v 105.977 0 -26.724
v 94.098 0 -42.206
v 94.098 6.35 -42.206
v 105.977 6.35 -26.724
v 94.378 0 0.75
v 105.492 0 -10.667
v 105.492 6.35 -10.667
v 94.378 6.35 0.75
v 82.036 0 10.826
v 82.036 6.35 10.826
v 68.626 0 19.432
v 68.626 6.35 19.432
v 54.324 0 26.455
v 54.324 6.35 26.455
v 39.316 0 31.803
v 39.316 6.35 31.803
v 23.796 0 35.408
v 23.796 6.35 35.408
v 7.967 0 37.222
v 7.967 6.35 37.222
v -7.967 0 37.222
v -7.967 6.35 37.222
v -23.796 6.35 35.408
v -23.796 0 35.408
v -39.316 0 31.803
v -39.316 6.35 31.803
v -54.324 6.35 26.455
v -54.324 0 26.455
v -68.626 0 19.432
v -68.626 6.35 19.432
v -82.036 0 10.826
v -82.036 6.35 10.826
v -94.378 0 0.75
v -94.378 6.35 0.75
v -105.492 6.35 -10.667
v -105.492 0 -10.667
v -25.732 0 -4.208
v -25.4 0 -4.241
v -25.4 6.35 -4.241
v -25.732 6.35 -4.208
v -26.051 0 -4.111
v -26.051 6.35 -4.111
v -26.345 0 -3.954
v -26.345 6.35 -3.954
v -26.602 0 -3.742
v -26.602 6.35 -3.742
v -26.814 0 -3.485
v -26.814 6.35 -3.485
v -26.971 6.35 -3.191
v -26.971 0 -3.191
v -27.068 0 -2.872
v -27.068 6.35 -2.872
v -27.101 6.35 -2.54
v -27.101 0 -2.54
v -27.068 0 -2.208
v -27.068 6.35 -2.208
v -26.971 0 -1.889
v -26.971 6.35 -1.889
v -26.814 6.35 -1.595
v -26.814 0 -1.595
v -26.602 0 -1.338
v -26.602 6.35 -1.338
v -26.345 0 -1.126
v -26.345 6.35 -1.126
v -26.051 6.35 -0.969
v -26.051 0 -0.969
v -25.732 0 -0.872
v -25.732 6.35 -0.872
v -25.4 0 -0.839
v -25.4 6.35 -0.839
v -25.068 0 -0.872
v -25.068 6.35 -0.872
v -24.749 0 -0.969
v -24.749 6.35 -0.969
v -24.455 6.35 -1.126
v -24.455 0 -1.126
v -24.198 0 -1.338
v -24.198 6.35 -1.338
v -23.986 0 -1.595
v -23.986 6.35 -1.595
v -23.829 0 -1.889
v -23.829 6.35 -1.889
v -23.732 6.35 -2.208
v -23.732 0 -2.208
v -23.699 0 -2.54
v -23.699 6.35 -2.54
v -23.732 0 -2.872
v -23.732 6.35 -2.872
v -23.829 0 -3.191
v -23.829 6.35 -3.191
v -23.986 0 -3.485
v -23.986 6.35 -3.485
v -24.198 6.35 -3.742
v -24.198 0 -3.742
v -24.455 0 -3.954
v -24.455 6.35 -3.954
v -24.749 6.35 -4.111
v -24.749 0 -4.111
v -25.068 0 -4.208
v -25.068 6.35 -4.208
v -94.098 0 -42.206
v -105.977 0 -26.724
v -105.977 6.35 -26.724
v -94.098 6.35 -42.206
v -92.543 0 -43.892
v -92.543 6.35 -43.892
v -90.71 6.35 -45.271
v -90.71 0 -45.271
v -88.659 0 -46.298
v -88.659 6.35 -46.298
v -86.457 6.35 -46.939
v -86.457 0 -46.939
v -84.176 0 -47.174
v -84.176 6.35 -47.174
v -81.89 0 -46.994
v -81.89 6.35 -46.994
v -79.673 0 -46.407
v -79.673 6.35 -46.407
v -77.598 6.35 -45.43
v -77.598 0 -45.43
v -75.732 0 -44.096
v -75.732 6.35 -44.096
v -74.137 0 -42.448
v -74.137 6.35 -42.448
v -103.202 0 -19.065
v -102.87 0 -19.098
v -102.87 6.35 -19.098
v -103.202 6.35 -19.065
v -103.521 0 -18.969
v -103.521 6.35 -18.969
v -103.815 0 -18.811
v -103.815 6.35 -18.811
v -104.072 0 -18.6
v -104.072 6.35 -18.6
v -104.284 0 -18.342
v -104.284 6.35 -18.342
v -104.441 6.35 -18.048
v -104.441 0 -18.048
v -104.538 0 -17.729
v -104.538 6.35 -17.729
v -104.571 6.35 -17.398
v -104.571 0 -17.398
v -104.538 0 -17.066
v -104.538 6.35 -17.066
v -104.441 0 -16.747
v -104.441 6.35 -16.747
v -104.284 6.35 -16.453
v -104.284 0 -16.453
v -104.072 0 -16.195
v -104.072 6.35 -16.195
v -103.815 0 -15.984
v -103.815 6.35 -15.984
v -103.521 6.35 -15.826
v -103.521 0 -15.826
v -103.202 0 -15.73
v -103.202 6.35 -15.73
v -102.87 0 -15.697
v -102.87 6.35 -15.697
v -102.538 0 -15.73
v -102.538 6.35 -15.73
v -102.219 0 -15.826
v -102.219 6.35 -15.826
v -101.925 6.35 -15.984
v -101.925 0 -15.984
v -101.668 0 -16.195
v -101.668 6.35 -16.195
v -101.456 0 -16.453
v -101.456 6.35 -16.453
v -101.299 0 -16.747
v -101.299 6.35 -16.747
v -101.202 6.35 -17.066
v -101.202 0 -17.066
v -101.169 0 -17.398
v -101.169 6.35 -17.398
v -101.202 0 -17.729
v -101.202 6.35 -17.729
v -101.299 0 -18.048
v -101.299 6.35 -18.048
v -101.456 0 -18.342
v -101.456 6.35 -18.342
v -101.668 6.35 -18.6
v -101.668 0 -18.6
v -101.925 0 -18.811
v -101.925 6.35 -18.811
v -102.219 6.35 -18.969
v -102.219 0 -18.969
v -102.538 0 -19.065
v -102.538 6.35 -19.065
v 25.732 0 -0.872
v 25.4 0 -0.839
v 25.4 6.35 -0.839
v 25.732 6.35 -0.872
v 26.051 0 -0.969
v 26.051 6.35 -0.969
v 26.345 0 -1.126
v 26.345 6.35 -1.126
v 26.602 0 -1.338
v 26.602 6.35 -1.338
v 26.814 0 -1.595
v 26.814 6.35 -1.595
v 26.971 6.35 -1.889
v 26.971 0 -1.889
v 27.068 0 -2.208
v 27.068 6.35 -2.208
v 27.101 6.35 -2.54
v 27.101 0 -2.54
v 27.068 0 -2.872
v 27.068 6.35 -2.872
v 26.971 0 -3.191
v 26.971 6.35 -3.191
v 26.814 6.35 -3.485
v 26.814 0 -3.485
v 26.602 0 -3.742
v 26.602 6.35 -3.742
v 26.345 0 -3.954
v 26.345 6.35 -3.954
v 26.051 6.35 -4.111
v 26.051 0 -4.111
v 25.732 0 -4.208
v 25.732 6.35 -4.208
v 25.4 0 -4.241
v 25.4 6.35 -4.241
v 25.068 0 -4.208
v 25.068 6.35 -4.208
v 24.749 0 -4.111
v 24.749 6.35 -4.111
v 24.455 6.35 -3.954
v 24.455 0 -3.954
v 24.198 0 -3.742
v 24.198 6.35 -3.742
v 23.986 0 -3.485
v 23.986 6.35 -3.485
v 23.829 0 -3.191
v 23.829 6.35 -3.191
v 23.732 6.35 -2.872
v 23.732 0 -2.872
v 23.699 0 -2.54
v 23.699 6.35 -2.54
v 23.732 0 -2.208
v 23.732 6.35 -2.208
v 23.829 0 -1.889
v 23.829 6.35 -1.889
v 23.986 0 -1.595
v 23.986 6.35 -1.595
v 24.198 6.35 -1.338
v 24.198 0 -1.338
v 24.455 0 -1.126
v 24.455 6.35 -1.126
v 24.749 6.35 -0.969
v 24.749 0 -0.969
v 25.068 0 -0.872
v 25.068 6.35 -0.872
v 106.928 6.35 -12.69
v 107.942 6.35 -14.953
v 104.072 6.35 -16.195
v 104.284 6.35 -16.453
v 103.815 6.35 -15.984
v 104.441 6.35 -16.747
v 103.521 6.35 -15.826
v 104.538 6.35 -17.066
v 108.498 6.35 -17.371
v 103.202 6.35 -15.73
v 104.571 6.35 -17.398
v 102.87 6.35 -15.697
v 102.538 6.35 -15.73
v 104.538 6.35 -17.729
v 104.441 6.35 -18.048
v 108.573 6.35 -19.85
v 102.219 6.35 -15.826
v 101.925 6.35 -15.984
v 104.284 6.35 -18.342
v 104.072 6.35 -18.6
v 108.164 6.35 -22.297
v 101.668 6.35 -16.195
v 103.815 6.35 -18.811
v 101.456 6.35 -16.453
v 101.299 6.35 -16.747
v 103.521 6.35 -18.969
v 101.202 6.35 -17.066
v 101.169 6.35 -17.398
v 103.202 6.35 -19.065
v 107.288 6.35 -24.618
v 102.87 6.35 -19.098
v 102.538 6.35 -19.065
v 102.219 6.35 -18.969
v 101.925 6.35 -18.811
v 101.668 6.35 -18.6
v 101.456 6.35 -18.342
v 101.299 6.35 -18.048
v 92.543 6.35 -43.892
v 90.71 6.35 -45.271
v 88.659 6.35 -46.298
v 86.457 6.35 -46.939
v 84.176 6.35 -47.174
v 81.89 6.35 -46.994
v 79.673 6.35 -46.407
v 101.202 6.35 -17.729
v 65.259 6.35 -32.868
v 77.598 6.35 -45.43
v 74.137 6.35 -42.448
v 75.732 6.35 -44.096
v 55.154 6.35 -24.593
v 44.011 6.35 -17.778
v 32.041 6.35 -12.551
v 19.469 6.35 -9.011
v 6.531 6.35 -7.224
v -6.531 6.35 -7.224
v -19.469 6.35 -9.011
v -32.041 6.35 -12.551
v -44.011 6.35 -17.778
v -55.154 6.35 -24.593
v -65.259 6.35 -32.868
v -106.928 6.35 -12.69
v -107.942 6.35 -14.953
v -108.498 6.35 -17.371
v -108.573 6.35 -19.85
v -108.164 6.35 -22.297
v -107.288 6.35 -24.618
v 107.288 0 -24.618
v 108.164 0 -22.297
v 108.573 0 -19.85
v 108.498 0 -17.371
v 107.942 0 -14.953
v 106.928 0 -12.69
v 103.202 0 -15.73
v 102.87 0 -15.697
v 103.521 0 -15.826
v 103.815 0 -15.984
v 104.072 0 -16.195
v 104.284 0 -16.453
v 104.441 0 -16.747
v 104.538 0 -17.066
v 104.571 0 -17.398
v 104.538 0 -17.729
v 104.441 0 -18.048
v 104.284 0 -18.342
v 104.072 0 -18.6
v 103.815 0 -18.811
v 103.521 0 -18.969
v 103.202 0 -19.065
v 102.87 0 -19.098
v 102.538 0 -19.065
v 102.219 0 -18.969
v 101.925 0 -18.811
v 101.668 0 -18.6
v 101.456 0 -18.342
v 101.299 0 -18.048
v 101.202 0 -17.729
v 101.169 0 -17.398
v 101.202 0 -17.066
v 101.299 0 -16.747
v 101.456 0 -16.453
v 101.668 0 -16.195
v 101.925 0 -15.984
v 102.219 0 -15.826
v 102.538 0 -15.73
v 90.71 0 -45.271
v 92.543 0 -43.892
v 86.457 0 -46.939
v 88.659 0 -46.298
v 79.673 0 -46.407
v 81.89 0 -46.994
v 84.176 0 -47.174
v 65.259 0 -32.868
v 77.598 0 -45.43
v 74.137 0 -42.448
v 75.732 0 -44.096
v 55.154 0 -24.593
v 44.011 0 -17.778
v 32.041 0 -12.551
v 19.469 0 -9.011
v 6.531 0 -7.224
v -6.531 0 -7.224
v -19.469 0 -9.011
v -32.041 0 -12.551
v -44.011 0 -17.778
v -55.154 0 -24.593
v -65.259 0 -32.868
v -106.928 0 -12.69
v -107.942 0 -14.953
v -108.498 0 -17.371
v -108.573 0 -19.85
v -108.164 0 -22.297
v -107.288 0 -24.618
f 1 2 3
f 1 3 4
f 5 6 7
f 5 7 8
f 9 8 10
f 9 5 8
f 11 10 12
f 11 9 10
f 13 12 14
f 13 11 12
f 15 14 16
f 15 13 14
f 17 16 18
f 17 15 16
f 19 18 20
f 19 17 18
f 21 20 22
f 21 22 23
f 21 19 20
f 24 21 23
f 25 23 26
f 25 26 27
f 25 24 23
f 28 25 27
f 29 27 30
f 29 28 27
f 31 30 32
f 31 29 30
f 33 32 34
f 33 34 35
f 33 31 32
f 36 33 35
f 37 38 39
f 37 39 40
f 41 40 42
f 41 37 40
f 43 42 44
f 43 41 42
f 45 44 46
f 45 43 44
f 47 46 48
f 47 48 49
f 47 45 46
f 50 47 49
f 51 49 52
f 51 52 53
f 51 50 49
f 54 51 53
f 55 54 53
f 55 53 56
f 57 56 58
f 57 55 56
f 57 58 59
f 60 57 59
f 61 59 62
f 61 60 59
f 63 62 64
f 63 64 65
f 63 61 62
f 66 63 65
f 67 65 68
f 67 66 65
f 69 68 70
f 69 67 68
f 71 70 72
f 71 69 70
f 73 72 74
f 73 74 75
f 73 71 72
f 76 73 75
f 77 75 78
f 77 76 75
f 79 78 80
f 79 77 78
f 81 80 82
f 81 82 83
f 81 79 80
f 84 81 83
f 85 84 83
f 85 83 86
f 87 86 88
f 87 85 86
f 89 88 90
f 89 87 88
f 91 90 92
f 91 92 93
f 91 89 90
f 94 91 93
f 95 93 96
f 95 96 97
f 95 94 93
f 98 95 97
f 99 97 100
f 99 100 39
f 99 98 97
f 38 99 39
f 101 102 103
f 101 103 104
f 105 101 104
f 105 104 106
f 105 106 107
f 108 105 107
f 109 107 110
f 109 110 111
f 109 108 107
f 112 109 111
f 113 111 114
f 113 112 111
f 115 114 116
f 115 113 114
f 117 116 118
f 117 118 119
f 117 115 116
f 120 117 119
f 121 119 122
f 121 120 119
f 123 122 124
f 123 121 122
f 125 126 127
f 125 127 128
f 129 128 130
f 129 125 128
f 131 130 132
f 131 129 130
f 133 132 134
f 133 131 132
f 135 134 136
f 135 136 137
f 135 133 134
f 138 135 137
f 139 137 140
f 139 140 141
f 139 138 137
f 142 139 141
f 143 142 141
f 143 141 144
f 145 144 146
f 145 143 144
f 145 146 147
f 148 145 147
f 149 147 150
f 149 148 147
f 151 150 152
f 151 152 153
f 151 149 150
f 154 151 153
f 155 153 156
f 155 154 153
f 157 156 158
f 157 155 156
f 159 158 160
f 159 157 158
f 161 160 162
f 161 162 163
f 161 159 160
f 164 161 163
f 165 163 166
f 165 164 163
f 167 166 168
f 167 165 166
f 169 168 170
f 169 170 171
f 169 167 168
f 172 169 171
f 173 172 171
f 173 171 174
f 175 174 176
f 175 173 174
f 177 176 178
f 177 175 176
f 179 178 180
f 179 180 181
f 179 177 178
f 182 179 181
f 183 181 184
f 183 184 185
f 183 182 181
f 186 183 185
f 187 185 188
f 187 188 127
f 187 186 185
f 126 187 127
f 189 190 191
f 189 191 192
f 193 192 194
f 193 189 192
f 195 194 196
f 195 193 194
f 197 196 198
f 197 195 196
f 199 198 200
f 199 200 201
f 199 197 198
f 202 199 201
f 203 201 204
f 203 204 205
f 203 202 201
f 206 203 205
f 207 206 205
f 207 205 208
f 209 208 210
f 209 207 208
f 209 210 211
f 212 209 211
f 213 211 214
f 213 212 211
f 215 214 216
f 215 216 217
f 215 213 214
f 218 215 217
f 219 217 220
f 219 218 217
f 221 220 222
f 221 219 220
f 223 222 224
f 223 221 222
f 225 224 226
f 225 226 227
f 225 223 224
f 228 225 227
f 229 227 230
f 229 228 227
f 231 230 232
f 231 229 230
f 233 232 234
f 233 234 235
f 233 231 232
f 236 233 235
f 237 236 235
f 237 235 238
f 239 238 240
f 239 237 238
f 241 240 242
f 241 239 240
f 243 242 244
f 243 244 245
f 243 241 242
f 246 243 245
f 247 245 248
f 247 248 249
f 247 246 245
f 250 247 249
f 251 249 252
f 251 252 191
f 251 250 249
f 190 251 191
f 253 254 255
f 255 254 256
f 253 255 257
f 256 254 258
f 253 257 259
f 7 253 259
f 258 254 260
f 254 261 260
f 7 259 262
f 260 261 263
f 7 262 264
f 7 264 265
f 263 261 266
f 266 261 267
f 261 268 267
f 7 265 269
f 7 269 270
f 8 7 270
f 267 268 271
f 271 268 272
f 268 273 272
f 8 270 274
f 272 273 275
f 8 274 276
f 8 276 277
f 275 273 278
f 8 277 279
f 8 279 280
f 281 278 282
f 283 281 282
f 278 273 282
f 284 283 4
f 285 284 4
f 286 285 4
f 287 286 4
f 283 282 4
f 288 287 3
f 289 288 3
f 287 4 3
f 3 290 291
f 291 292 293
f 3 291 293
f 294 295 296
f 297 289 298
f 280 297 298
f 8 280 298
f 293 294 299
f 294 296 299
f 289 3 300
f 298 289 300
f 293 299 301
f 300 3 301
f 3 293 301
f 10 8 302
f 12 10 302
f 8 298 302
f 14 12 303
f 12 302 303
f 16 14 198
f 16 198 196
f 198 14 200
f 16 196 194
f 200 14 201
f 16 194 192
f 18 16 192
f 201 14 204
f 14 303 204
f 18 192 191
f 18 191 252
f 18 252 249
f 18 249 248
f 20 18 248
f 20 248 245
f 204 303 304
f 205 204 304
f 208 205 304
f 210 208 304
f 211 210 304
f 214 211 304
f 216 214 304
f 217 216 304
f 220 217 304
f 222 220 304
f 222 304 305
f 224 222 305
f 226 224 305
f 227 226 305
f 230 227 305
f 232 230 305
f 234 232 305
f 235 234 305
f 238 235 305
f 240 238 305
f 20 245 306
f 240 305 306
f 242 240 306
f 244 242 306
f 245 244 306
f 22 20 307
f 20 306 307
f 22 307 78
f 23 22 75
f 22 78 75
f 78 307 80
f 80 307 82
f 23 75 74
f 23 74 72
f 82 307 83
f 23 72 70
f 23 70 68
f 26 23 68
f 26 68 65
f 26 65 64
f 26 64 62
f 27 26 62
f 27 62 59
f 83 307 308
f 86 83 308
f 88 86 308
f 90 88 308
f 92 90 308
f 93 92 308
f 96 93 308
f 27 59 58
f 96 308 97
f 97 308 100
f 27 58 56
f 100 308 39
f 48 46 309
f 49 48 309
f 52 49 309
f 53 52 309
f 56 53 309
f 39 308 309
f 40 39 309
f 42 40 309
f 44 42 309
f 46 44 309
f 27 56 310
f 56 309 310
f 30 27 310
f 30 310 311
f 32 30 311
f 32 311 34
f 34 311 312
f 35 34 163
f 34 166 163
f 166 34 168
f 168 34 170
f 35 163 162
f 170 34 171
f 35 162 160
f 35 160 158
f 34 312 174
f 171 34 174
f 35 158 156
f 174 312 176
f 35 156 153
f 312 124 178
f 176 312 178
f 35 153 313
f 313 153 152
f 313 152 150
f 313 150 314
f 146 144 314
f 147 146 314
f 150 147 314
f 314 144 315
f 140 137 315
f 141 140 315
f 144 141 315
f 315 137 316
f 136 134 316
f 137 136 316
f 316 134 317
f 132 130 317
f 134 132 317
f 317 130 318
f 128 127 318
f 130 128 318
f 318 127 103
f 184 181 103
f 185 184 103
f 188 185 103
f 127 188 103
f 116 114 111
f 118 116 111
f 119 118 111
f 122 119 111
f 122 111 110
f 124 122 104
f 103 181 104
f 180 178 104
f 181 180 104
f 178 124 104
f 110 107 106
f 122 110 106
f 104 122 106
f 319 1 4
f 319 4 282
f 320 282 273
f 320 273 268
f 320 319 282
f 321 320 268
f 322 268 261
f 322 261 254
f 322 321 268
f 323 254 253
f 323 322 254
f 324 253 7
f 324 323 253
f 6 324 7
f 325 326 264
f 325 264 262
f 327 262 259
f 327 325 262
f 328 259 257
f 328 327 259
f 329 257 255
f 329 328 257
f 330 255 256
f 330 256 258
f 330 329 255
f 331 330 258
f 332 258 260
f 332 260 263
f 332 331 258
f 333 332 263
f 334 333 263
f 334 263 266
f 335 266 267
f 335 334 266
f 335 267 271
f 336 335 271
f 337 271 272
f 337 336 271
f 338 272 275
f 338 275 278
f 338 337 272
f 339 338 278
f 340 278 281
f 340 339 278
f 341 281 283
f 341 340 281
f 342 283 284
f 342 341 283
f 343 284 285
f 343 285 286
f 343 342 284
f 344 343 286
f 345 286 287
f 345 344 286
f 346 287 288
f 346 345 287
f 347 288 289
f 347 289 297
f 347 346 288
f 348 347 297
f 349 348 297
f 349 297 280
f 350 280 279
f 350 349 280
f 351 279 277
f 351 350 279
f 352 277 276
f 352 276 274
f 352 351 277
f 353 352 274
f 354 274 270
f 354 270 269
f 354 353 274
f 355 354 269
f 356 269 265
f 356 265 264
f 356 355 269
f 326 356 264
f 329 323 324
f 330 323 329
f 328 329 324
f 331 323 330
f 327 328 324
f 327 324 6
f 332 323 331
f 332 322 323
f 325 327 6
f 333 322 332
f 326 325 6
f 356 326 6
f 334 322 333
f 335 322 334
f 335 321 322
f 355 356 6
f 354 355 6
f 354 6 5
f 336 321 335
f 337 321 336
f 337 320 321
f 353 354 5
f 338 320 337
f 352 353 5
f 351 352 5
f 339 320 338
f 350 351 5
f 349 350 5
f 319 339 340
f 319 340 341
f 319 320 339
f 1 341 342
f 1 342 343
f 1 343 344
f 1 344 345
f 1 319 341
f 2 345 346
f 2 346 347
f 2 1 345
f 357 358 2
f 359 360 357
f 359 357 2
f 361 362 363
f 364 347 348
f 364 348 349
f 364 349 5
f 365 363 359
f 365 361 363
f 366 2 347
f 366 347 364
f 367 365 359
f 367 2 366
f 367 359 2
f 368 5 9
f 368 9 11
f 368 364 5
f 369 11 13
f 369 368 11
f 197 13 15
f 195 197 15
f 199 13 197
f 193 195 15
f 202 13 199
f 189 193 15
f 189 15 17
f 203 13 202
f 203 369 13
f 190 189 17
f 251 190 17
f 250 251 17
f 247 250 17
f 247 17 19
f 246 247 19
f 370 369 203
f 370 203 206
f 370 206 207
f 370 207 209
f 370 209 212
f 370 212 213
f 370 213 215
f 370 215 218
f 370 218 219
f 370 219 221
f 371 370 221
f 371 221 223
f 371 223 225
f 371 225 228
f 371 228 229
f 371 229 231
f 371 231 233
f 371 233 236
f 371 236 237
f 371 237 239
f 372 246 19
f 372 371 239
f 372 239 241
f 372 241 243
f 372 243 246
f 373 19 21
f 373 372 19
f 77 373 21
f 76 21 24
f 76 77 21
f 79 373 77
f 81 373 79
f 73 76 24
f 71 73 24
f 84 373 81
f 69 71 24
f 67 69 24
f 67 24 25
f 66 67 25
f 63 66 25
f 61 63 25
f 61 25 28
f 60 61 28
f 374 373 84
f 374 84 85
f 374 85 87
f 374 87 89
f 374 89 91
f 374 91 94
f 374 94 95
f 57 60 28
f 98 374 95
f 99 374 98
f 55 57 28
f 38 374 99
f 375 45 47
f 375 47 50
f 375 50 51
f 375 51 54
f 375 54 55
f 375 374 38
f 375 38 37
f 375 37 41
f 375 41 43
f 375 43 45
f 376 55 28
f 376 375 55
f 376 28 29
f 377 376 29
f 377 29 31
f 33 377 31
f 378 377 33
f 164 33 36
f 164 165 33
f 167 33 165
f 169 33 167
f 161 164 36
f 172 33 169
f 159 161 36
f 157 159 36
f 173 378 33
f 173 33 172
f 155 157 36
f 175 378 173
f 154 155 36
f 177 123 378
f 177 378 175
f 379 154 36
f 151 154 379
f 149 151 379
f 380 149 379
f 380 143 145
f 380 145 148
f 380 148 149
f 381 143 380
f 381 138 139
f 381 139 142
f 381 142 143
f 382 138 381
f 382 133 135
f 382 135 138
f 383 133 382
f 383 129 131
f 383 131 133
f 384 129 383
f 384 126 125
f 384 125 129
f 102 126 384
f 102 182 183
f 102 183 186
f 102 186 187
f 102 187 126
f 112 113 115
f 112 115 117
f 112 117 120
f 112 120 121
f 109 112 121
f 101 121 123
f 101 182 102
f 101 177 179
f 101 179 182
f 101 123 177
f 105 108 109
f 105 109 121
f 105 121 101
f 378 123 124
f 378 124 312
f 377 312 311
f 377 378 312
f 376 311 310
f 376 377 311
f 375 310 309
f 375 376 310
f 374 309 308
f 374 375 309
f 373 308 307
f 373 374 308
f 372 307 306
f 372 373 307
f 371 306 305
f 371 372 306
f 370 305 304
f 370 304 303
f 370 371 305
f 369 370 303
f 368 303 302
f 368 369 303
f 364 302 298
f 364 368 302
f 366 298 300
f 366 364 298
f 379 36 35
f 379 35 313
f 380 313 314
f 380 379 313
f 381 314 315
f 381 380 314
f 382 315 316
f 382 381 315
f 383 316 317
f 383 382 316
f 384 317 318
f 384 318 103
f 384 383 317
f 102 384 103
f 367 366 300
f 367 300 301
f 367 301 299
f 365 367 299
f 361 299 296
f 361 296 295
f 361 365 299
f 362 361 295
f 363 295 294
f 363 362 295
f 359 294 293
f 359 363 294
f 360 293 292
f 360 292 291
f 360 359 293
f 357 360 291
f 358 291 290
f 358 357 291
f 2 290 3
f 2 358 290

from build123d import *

# Parameters (mm, degrees)
SKETCH1_R           = 1.70053
BOSS_EXTRUDE1_DEPTH = 6.35


with BuildPart() as part:
    # Sketch1 → Boss-Extrude1 (new body)
    with BuildSketch(Plane(origin=(0, 0, 0), x_dir=(1, 0, 0), z_dir=(0, 1, 0))):
        with BuildLine():
            Line((-105.977429974, 26.723858277), (-94.097535909, 42.20603765))
            ThreePointArc((-94.097535909, 42.20603765), (-84.176111379, 47.17383179), (-74.137013371, 42.448352501))
            ThreePointArc((-74.137013371, 42.448352501), (0, 7.00024), (74.137013371, 42.448352501))
            ThreePointArc((74.137013371, 42.448352501), (84.176111379, 47.17383179), (94.097535909, 42.20603765))
            Line((94.097535909, 42.20603765), (105.977429974, 26.723858277))
            ThreePointArc((105.977429974, 26.723858277), (108.596043585, 18.608843232), (105.492026807, 10.666822942))
            ThreePointArc((105.492026807, 10.666822942), (0, -37.44976), (-105.492026807, 10.666822942))
            ThreePointArc((-105.492026807, 10.666822942), (-108.596043585, 18.608843232), (-105.977429974, 26.723858277))
        make_face()
        with Locations(Location((102.87, 17.39751111, 0), (0, 0, 270))):
            Circle(SKETCH1_R, mode=Mode.SUBTRACT)
        with Locations(Location((25.4, 2.54, 0), (0, 0, 270))):
            Circle(SKETCH1_R, mode=Mode.SUBTRACT)
        with Locations(Location((-102.87, 17.39751111, 0), (0, 0, 90))):
            Circle(SKETCH1_R, mode=Mode.SUBTRACT)
        with Locations(Location((-25.4, 2.54, 0), (0, 0, 90))):
            Circle(SKETCH1_R, mode=Mode.SUBTRACT)
    extrude(amount=BOSS_EXTRUDE1_DEPTH)


solid = part.part
